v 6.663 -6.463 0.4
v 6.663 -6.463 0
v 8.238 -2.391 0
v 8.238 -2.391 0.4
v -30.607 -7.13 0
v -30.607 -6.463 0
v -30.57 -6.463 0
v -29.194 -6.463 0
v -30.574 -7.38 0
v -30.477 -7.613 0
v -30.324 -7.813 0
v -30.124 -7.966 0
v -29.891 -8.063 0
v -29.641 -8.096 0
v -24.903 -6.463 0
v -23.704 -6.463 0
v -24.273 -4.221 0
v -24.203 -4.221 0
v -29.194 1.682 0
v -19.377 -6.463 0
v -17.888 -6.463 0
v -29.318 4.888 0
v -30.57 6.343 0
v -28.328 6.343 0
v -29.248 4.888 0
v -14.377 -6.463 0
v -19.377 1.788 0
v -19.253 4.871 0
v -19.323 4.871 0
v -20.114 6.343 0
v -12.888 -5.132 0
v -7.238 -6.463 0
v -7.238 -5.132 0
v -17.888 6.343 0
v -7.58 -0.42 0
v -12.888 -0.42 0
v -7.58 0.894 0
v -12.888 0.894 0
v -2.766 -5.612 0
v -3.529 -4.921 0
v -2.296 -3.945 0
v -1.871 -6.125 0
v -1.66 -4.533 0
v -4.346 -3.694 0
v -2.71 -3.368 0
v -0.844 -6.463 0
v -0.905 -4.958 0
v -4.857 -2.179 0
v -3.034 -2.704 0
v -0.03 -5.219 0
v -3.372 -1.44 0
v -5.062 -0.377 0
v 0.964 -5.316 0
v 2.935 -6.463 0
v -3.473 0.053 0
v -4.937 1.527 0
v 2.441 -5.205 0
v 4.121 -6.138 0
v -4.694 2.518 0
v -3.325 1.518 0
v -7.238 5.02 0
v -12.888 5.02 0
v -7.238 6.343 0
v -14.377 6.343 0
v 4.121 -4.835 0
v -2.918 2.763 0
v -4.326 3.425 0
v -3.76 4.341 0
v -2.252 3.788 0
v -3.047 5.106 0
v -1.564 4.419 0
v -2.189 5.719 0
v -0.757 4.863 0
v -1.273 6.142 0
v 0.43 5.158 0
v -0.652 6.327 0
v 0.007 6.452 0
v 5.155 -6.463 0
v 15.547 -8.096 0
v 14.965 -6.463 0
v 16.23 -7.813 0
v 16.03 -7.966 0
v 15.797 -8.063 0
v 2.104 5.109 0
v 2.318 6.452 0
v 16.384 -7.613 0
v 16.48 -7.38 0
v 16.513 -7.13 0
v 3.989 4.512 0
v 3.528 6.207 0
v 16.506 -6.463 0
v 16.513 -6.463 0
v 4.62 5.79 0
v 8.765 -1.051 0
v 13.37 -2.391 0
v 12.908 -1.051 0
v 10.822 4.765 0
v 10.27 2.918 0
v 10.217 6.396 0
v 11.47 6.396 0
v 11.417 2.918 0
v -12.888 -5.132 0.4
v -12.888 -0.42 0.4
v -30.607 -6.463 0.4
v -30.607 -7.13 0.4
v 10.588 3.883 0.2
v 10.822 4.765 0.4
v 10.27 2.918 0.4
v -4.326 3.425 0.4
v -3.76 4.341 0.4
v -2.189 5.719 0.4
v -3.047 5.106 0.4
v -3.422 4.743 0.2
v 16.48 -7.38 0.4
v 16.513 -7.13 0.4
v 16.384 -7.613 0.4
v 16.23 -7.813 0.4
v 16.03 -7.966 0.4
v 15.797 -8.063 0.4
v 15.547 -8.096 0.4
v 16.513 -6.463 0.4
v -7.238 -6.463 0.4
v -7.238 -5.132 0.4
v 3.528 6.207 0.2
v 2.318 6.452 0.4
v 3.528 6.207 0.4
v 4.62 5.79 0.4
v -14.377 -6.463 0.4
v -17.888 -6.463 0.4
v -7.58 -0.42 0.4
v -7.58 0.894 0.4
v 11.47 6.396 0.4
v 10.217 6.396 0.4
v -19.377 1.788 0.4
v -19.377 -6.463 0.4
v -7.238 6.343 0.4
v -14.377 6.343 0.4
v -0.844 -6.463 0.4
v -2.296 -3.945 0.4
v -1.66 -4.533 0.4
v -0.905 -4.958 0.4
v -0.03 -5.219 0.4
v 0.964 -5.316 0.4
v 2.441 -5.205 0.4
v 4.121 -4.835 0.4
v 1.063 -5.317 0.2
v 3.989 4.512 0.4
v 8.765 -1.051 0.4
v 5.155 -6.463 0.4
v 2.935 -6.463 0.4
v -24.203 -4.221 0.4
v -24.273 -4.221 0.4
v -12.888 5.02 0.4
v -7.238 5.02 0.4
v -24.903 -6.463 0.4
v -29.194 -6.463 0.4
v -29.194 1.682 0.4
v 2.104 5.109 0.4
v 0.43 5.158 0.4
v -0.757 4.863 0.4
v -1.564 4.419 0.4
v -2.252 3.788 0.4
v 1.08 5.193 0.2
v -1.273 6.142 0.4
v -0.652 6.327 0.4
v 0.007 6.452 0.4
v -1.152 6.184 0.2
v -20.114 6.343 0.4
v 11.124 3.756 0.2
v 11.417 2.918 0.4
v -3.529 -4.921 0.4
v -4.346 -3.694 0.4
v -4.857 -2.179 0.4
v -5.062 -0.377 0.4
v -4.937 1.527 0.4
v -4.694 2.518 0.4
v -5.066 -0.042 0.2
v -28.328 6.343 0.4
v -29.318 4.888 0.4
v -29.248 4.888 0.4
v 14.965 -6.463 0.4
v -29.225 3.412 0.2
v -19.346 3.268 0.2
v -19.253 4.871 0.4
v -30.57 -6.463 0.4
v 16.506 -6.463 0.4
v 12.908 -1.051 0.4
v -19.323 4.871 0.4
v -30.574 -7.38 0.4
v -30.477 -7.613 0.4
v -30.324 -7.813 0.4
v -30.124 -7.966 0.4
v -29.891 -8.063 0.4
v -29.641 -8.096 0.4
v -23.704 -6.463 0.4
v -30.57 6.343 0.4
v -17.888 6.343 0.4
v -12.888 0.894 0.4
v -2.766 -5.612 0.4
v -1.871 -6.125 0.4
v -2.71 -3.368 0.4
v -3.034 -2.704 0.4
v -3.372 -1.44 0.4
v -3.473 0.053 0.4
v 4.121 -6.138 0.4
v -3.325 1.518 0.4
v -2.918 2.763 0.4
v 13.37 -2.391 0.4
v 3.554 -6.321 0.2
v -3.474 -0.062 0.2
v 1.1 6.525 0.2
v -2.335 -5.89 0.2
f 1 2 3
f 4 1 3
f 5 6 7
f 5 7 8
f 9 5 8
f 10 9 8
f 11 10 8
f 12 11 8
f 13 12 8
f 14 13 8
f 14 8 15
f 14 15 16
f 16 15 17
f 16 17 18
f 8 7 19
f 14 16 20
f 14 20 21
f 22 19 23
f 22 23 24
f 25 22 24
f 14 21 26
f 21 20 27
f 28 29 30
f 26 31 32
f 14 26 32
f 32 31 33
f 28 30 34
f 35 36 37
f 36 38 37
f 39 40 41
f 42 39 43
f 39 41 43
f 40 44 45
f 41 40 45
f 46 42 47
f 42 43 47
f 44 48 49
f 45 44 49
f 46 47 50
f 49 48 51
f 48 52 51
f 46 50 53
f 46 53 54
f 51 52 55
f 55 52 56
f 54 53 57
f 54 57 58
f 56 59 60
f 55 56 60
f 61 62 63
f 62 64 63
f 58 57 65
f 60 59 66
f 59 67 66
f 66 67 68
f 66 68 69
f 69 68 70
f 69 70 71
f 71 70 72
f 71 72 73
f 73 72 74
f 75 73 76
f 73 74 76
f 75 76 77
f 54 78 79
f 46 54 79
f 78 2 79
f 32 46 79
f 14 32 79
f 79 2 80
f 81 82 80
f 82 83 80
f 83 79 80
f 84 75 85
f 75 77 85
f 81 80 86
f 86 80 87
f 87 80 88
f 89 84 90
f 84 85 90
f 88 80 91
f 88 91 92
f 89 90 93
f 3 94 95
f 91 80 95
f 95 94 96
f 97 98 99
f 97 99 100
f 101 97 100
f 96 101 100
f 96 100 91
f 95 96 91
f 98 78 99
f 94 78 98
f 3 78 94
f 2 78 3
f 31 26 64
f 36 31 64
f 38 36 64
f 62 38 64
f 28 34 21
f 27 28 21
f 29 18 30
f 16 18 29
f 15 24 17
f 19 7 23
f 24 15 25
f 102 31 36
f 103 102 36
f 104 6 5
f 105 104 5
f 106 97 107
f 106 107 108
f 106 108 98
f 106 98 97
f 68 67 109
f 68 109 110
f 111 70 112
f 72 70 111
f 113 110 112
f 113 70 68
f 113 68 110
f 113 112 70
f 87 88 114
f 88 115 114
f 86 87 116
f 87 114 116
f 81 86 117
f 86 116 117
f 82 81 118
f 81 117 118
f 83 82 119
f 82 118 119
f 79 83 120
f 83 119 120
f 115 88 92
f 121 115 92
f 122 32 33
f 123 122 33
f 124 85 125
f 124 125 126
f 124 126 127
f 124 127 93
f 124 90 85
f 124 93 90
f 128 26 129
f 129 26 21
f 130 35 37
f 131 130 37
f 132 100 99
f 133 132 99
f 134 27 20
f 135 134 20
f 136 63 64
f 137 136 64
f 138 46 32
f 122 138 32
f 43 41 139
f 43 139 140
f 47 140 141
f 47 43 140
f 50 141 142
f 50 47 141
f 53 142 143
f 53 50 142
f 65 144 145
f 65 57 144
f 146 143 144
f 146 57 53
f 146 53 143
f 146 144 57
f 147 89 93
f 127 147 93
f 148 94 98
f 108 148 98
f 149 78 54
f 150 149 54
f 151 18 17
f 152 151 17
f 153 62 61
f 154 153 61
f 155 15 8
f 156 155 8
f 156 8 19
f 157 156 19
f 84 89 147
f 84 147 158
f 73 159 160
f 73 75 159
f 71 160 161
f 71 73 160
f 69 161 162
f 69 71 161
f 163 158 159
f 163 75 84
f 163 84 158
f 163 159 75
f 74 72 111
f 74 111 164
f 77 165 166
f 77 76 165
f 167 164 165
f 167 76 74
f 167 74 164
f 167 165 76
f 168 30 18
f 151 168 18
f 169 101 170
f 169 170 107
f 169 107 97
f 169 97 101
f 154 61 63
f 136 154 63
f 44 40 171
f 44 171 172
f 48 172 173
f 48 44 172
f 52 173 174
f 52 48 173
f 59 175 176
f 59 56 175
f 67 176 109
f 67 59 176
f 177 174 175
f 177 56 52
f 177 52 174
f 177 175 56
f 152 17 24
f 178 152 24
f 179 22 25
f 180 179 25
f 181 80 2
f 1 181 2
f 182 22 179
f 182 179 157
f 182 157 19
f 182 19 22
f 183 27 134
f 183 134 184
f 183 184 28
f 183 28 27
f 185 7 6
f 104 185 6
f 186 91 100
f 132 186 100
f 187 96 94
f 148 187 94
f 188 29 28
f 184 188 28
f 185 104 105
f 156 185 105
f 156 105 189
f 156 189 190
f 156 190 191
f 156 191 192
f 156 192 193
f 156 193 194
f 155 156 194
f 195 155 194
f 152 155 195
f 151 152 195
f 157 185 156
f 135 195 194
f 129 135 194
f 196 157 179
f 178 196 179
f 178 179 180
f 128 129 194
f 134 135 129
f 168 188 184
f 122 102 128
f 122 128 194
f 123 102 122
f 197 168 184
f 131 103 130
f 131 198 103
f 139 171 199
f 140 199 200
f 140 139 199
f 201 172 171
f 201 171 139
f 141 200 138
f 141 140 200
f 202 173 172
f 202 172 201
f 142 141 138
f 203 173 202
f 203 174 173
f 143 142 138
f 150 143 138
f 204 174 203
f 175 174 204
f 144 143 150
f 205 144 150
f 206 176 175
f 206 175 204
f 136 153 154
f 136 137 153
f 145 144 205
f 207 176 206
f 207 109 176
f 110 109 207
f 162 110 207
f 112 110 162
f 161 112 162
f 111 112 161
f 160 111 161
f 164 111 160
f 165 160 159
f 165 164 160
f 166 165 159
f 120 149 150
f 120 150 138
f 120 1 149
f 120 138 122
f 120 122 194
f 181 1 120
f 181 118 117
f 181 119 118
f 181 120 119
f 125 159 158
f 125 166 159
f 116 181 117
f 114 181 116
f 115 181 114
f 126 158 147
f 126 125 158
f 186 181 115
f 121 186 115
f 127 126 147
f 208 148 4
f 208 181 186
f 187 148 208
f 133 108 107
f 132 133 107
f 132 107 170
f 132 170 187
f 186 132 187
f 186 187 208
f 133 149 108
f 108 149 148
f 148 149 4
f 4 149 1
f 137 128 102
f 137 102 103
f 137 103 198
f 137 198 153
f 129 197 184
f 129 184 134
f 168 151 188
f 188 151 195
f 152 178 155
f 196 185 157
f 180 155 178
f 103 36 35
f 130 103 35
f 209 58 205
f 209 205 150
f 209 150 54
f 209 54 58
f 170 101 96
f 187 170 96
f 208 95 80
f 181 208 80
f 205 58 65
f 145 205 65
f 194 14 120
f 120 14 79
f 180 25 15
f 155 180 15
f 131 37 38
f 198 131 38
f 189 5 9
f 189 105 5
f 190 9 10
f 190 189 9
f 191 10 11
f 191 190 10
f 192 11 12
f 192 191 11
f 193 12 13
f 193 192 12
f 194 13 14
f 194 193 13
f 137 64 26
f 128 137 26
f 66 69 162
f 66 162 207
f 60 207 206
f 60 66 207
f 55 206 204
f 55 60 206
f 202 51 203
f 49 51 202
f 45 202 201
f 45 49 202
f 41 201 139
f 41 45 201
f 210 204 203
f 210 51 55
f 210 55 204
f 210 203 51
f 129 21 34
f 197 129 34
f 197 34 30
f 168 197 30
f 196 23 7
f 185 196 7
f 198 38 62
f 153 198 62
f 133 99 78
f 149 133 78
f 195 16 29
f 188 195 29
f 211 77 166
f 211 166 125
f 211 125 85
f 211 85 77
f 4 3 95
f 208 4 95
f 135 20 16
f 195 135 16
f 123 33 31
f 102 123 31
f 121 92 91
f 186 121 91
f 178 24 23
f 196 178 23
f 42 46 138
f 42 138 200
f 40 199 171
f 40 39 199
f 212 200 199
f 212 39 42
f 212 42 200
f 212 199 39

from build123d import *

# Parameters (mm, degrees)
F1_DEPTH = 0.4
F2_R     = 0.9656854249


with BuildPart() as f1:
    # F0 (on Top) → F1 (new body)
    with BuildSketch(Plane.XY):
        with BuildLine():
            Line((2.3177045503, 6.4518758865), (0.0068321246, 6.4518758865))
            add(Edge.make_bspline(
                [(-2.1890329452, 5.7189722991), (-1.2120452677, 6.2824305885), (0.0068321246, 6.4518758865)],
                knots=[0, 0, 0, 0.6992762354, 0.6992762354, 0.6992762354], degree=2))
            add(Edge.make_bspline(
                [(-4.3260845147, 3.4249700569), (-3.5861742008, 4.9131987565), (-2.1890329452, 5.7189722991)],
                knots=[0, 0, 0, 1, 1, 1], degree=2))
            add(Edge.make_bspline(
                [(-5.0659948286, -0.0419581942), (-5.0659948286, 1.9367413574), (-4.3260845147, 3.4249700569)],
                knots=[0, 0, 0, 1, 1, 1], degree=2))
            add(Edge.make_bspline(
                [(-3.5287190438, -4.9214424991), (-5.0659948286, -3.2033931718), (-5.0659948286, -0.0419581942)],
                knots=[0, 0, 0, 1, 1, 1], degree=2))
            add(Edge.make_bspline(
                [(-0.8440462353, -6.4629223198), (-2.48426723, -6.0887149912), (-3.5287190438, -4.9214424991)],
                knots=[0.3205826669, 0.3205826669, 0.3205826669, 1, 1, 1], degree=2))
            Line((-0.8440462353, -6.4629223198), (-0.101907946, -6.4629223198))
            Line((-0.101907946, -6.4629223198), (2.9353164681, -6.4629223198))
            add(Edge.make_bspline(
                [(4.1212249023, -6.1378102121), (3.5797384986, -6.3418650885), (2.9353164681, -6.4629223198)],
                knots=[0, 0, 0, 0.406741787, 0.406741787, 0.406741787], degree=2))
            Line((4.1212249023, -6.1378102121), (4.1212249023, -4.8345590911))
            add(Edge.make_bspline(
                [(1.0634894763, -5.3166218713), (2.403175575, -5.3166218713), (4.1212249023, -4.8345590911)],
                knots=[0, 0, 0, 1, 1, 1], degree=2))
            add(Edge.make_bspline(
                [(-2.2955351873, -3.944704831), (-1.1170037972, -5.3166218713), (1.0634894763, -5.3166218713)],
                knots=[0, 0, 0, 1, 1, 1], degree=2))
            add(Edge.make_bspline(
                [(-3.4740665775, -0.0615770283), (-3.4740665775, -2.5727877906), (-2.2955351873, -3.944704831)],
                knots=[0, 0, 0, 1, 1, 1], degree=2))
            add(Edge.make_bspline(
                [(-2.2520934833, 3.7879184874), (-3.4740665775, 2.3823691601), (-3.4740665775, -0.0615770283)],
                knots=[0, 0, 0, 1, 1, 1], degree=2))
            add(Edge.make_bspline(
                [(1.0803056198, 5.1934678148), (-1.0301203891, 5.1934678148), (-2.2520934833, 3.7879184874)],
                knots=[0, 0, 0, 1, 1, 1], degree=2))
            add(Edge.make_bspline(
                [(3.9894984449, 4.5124140031), (2.5349020324, 5.1934678148), (1.0803056198, 5.1934678148)],
                knots=[0, 0, 0, 1, 1, 1], degree=2))
            Line((3.9894984449, 4.5124140031), (4.6201038261, 5.7904409089))
            add(Edge.make_bspline(
                [(2.3177045503, 6.4518758865), (3.587256127, 6.2934262197), (4.6201038261, 5.7904409089)],
                knots=[0.3150184776, 0.3150184776, 0.3150184776, 1, 1, 1], degree=2))
        make_face()
        Polygon((-10.8601368731, -6.4629223198), (-7.2380800304, -6.4629223198), (-7.2380800304, -5.1316442929), (-12.8883042456, -5.1316442929), (-12.8883042456, -0.4203214229), (-7.5800082815, -0.4203214229), (-7.5800082815, 0.8941404605), (-12.8883042456, 0.8941404605), (-12.8883042456, 5.0197009986), (-7.2380800304, 5.0197009986), (-7.2380800304, 6.3425709538), (-14.3765329452, 6.3425709538), (-14.3765329452, -6.4629223198), (-12.6325140038, -6.4629223198), align=None)
        with BuildLine():
            Line((-19.3765329452, -6.4629223198), (-17.8883042456, -6.4629223198))
            Line((-17.8883042456, -6.4629223198), (-17.8883042456, 6.3425709538))
            Line((-17.8883042456, 6.3425709538), (-20.1136405685, 6.3425709538))
            Line((-20.1136405685, 6.3425709538), (-24.2027661291, -4.2207698534))
            Line((-24.2027661291, -4.2207698534), (-24.2728333936, -4.2207698534))
            Line((-24.2728333936, -4.2207698534), (-28.3283266672, 6.3425709538))
            Line((-28.3283266672, 6.3425709538), (-30.5704791335, 6.3425709538))
            Line((-30.5704791335, 6.3425709538), (-30.5704791335, -6.4629223198))
            Line((-30.5704791335, -6.4629223198), (-29.1943580573, -6.4629223198))
            Line((-29.1943580573, -6.4629223198), (-29.1943580573, 1.6816965143))
            add(Edge.make_bspline(
                [(-29.317676443, 4.8879745412), (-29.1943580573, 3.5398803708), (-29.1943580573, 1.6816965143)],
                knots=[0, 0, 0, 1, 1, 1], degree=2))
            Line((-29.317676443, 4.8879745412), (-29.2476091784, 4.8879745412))
            Line((-29.2476091784, 4.8879745412), (-24.9034387748, -6.4629223198))
            Line((-24.9034387748, -6.4629223198), (-23.7038872053, -6.4629223198))
            Line((-23.7038872053, -6.4629223198), (-19.3232818241, 4.8711583977))
            Line((-19.3232818241, 4.8711583977), (-19.2532145595, 4.8711583977))
            add(Edge.make_bspline(
                [(-19.3765329452, 1.7881987565), (-19.3765329452, 3.2063601914), (-19.2532145595, 4.8711583977)],
                knots=[0, 0, 0, 1, 1, 1], degree=2))
            Line((-19.3765329452, 1.7881987565), (-19.3765329452, -6.4629223198))
        make_face()
        Polygon((10.2170769203, 6.3958220748), (5.1554177275, -6.4629223198), (6.6632652611, -6.4629223198), (8.2383773687, -2.3906129027), (13.3701038261, -2.3906129027), (14.9648347678, -6.4629223198), (16.5063145884, -6.4629223198), (11.4698796109, 6.3958220748), align=None)
        with BuildLine():
            Line((11.4166284898, 2.9176830614), (12.9076598799, -1.0509268041))
            Line((12.9076598799, -1.0509268041), (8.7652831983, -1.0509268041))
            Line((8.7652831983, -1.0509268041), (10.2703280414, 2.9176830614))
            add(Edge.make_bspline(
                [(10.8224580862, 4.7646561556), (10.629072436, 3.9238489807), (10.2703280414, 2.9176830614)],
                knots=[0, 0, 0, 1, 1, 1], degree=2))
            add(Edge.make_bspline(
                [(11.4166284898, 2.9176830614), (11.1279513597, 3.6716068282), (10.8224580862, 4.7646561556)],
                knots=[0, 0, 0, 1, 1, 1], degree=2))
        make_face(mode=Mode.SUBTRACT)
        with BuildLine():
            add(Edge.make_bspline(
                [(0.0068321246, 6.4518758865), (0.5310103813, 6.5247458417), (1.0999244539, 6.5247458417)],
                knots=[0.6992762354, 0.6992762354, 0.6992762354, 1, 1, 1], degree=2))
            Line((0.0068321246, 6.4518758865), (2.3177045503, 6.4518758865))
            add(Edge.make_bspline(
                [(1.0999244539, 6.5247458417), (1.7338461661, 6.5247458417), (2.3177045503, 6.4518758865)],
                knots=[0, 0, 0, 0.3150184776, 0.3150184776, 0.3150184776], degree=2))
        make_face()
        with BuildLine():
            add(Edge.make_bspline(
                [(-0.1528043431, -6.582261177), (-0.5107269616, -6.5389672645), (-0.8440462353, -6.4629223198)],
                knots=[0.1825141428, 0.1825141428, 0.1825141428, 0.3205826669, 0.3205826669, 0.3205826669], degree=2))
            Line((-0.8440462353, -6.4629223198), (-7.2380800304, -6.4629223198))
            Line((-7.2380800304, -6.4629223198), (-10.8601368731, -6.4629223198))
            Line((-10.8601368731, -6.4629223198), (-12.6325140038, -6.4629223198))
            Line((-12.6325140038, -6.4629223198), (-14.3765329452, -6.4629223198))
            Line((-14.3765329452, -6.4629223198), (-17.8883042456, -6.4629223198))
            Line((-17.8883042456, -6.4629223198), (-19.3765329452, -6.4629223198))
            Line((-19.3765329452, -6.4629223198), (-23.7038872053, -6.4629223198))
            Line((-23.7038872053, -6.4629223198), (-24.9034387748, -6.4629223198))
            Line((-24.9034387748, -6.4629223198), (-29.1943580573, -6.4629223198))
            Line((-29.1943580573, -6.4629223198), (-30.5704791335, -6.4629223198))
            Line((-30.5704791335, -6.4629223198), (-30.6066181511, -6.4629223198))
            Line((-30.6066181511, -6.4629223198), (-30.6066181511, -8.0955233425))
            Line((-30.6066181511, -8.0955233425), (16.5128931403, -8.0955233425))
            Line((16.5128931403, -8.0955233425), (16.5128931403, -6.4629223198))
            Line((16.5128931403, -6.4629223198), (16.5063145884, -6.4629223198))
            Line((16.5063145884, -6.4629223198), (14.9648347678, -6.4629223198))
            Line((14.9648347678, -6.4629223198), (6.6632652611, -6.4629223198))
            Line((6.6632652611, -6.4629223198), (5.1554177275, -6.4629223198))
            Line((5.1554177275, -6.4629223198), (2.9353164681, -6.4629223198))
            add(Edge.make_bspline(
                [(2.9353164681, -6.4629223198), (1.9953868262, -6.6394918265), (0.8364715391, -6.6394918265)],
                knots=[0.406741787, 0.406741787, 0.406741787, 1, 1, 1], degree=2))
            add(Edge.make_bspline(
                [(0.8364715391, -6.6394918265), (0.3203370938, -6.6394918265), (-0.1528043431, -6.582261177)],
                knots=[0, 0, 0, 0.1825141428, 0.1825141428, 0.1825141428], degree=2))
        make_face()
        with BuildLine():
            Line((-0.101907946, -6.4629223198), (-0.8440462353, -6.4629223198))
            add(Edge.make_bspline(
                [(-0.1528043431, -6.582261177), (-0.5107269616, -6.5389672645), (-0.8440462353, -6.4629223198)],
                knots=[0.1825141428, 0.1825141428, 0.1825141428, 0.3205826669, 0.3205826669, 0.3205826669], degree=2))
            Line((-0.1528043431, -6.582261177), (-0.101907946, -6.4629223198))
        make_face()
        with BuildLine():
            Line((2.9353164681, -6.4629223198), (-0.101907946, -6.4629223198))
            Line((-0.101907946, -6.4629223198), (-0.1528043431, -6.582261177))
            add(Edge.make_bspline(
                [(0.8364715391, -6.6394918265), (0.3203370938, -6.6394918265), (-0.1528043431, -6.582261177)],
                knots=[0, 0, 0, 0.1825141428, 0.1825141428, 0.1825141428], degree=2))
            add(Edge.make_bspline(
                [(2.9353164681, -6.4629223198), (1.9953868262, -6.6394918265), (0.8364715391, -6.6394918265)],
                knots=[0.406741787, 0.406741787, 0.406741787, 1, 1, 1], degree=2))
        make_face()
    extrude(amount=F1_DEPTH)

    # F2
    f2_edges = [f1.edges().sort_by_distance(p)[0] for p in [
        (-30.606618, -8.095523, 0.2),
        (16.512893, -8.095523, 0.2),
    ]]
    fillet(f2_edges, radius=F2_R)


solid = f1.part
